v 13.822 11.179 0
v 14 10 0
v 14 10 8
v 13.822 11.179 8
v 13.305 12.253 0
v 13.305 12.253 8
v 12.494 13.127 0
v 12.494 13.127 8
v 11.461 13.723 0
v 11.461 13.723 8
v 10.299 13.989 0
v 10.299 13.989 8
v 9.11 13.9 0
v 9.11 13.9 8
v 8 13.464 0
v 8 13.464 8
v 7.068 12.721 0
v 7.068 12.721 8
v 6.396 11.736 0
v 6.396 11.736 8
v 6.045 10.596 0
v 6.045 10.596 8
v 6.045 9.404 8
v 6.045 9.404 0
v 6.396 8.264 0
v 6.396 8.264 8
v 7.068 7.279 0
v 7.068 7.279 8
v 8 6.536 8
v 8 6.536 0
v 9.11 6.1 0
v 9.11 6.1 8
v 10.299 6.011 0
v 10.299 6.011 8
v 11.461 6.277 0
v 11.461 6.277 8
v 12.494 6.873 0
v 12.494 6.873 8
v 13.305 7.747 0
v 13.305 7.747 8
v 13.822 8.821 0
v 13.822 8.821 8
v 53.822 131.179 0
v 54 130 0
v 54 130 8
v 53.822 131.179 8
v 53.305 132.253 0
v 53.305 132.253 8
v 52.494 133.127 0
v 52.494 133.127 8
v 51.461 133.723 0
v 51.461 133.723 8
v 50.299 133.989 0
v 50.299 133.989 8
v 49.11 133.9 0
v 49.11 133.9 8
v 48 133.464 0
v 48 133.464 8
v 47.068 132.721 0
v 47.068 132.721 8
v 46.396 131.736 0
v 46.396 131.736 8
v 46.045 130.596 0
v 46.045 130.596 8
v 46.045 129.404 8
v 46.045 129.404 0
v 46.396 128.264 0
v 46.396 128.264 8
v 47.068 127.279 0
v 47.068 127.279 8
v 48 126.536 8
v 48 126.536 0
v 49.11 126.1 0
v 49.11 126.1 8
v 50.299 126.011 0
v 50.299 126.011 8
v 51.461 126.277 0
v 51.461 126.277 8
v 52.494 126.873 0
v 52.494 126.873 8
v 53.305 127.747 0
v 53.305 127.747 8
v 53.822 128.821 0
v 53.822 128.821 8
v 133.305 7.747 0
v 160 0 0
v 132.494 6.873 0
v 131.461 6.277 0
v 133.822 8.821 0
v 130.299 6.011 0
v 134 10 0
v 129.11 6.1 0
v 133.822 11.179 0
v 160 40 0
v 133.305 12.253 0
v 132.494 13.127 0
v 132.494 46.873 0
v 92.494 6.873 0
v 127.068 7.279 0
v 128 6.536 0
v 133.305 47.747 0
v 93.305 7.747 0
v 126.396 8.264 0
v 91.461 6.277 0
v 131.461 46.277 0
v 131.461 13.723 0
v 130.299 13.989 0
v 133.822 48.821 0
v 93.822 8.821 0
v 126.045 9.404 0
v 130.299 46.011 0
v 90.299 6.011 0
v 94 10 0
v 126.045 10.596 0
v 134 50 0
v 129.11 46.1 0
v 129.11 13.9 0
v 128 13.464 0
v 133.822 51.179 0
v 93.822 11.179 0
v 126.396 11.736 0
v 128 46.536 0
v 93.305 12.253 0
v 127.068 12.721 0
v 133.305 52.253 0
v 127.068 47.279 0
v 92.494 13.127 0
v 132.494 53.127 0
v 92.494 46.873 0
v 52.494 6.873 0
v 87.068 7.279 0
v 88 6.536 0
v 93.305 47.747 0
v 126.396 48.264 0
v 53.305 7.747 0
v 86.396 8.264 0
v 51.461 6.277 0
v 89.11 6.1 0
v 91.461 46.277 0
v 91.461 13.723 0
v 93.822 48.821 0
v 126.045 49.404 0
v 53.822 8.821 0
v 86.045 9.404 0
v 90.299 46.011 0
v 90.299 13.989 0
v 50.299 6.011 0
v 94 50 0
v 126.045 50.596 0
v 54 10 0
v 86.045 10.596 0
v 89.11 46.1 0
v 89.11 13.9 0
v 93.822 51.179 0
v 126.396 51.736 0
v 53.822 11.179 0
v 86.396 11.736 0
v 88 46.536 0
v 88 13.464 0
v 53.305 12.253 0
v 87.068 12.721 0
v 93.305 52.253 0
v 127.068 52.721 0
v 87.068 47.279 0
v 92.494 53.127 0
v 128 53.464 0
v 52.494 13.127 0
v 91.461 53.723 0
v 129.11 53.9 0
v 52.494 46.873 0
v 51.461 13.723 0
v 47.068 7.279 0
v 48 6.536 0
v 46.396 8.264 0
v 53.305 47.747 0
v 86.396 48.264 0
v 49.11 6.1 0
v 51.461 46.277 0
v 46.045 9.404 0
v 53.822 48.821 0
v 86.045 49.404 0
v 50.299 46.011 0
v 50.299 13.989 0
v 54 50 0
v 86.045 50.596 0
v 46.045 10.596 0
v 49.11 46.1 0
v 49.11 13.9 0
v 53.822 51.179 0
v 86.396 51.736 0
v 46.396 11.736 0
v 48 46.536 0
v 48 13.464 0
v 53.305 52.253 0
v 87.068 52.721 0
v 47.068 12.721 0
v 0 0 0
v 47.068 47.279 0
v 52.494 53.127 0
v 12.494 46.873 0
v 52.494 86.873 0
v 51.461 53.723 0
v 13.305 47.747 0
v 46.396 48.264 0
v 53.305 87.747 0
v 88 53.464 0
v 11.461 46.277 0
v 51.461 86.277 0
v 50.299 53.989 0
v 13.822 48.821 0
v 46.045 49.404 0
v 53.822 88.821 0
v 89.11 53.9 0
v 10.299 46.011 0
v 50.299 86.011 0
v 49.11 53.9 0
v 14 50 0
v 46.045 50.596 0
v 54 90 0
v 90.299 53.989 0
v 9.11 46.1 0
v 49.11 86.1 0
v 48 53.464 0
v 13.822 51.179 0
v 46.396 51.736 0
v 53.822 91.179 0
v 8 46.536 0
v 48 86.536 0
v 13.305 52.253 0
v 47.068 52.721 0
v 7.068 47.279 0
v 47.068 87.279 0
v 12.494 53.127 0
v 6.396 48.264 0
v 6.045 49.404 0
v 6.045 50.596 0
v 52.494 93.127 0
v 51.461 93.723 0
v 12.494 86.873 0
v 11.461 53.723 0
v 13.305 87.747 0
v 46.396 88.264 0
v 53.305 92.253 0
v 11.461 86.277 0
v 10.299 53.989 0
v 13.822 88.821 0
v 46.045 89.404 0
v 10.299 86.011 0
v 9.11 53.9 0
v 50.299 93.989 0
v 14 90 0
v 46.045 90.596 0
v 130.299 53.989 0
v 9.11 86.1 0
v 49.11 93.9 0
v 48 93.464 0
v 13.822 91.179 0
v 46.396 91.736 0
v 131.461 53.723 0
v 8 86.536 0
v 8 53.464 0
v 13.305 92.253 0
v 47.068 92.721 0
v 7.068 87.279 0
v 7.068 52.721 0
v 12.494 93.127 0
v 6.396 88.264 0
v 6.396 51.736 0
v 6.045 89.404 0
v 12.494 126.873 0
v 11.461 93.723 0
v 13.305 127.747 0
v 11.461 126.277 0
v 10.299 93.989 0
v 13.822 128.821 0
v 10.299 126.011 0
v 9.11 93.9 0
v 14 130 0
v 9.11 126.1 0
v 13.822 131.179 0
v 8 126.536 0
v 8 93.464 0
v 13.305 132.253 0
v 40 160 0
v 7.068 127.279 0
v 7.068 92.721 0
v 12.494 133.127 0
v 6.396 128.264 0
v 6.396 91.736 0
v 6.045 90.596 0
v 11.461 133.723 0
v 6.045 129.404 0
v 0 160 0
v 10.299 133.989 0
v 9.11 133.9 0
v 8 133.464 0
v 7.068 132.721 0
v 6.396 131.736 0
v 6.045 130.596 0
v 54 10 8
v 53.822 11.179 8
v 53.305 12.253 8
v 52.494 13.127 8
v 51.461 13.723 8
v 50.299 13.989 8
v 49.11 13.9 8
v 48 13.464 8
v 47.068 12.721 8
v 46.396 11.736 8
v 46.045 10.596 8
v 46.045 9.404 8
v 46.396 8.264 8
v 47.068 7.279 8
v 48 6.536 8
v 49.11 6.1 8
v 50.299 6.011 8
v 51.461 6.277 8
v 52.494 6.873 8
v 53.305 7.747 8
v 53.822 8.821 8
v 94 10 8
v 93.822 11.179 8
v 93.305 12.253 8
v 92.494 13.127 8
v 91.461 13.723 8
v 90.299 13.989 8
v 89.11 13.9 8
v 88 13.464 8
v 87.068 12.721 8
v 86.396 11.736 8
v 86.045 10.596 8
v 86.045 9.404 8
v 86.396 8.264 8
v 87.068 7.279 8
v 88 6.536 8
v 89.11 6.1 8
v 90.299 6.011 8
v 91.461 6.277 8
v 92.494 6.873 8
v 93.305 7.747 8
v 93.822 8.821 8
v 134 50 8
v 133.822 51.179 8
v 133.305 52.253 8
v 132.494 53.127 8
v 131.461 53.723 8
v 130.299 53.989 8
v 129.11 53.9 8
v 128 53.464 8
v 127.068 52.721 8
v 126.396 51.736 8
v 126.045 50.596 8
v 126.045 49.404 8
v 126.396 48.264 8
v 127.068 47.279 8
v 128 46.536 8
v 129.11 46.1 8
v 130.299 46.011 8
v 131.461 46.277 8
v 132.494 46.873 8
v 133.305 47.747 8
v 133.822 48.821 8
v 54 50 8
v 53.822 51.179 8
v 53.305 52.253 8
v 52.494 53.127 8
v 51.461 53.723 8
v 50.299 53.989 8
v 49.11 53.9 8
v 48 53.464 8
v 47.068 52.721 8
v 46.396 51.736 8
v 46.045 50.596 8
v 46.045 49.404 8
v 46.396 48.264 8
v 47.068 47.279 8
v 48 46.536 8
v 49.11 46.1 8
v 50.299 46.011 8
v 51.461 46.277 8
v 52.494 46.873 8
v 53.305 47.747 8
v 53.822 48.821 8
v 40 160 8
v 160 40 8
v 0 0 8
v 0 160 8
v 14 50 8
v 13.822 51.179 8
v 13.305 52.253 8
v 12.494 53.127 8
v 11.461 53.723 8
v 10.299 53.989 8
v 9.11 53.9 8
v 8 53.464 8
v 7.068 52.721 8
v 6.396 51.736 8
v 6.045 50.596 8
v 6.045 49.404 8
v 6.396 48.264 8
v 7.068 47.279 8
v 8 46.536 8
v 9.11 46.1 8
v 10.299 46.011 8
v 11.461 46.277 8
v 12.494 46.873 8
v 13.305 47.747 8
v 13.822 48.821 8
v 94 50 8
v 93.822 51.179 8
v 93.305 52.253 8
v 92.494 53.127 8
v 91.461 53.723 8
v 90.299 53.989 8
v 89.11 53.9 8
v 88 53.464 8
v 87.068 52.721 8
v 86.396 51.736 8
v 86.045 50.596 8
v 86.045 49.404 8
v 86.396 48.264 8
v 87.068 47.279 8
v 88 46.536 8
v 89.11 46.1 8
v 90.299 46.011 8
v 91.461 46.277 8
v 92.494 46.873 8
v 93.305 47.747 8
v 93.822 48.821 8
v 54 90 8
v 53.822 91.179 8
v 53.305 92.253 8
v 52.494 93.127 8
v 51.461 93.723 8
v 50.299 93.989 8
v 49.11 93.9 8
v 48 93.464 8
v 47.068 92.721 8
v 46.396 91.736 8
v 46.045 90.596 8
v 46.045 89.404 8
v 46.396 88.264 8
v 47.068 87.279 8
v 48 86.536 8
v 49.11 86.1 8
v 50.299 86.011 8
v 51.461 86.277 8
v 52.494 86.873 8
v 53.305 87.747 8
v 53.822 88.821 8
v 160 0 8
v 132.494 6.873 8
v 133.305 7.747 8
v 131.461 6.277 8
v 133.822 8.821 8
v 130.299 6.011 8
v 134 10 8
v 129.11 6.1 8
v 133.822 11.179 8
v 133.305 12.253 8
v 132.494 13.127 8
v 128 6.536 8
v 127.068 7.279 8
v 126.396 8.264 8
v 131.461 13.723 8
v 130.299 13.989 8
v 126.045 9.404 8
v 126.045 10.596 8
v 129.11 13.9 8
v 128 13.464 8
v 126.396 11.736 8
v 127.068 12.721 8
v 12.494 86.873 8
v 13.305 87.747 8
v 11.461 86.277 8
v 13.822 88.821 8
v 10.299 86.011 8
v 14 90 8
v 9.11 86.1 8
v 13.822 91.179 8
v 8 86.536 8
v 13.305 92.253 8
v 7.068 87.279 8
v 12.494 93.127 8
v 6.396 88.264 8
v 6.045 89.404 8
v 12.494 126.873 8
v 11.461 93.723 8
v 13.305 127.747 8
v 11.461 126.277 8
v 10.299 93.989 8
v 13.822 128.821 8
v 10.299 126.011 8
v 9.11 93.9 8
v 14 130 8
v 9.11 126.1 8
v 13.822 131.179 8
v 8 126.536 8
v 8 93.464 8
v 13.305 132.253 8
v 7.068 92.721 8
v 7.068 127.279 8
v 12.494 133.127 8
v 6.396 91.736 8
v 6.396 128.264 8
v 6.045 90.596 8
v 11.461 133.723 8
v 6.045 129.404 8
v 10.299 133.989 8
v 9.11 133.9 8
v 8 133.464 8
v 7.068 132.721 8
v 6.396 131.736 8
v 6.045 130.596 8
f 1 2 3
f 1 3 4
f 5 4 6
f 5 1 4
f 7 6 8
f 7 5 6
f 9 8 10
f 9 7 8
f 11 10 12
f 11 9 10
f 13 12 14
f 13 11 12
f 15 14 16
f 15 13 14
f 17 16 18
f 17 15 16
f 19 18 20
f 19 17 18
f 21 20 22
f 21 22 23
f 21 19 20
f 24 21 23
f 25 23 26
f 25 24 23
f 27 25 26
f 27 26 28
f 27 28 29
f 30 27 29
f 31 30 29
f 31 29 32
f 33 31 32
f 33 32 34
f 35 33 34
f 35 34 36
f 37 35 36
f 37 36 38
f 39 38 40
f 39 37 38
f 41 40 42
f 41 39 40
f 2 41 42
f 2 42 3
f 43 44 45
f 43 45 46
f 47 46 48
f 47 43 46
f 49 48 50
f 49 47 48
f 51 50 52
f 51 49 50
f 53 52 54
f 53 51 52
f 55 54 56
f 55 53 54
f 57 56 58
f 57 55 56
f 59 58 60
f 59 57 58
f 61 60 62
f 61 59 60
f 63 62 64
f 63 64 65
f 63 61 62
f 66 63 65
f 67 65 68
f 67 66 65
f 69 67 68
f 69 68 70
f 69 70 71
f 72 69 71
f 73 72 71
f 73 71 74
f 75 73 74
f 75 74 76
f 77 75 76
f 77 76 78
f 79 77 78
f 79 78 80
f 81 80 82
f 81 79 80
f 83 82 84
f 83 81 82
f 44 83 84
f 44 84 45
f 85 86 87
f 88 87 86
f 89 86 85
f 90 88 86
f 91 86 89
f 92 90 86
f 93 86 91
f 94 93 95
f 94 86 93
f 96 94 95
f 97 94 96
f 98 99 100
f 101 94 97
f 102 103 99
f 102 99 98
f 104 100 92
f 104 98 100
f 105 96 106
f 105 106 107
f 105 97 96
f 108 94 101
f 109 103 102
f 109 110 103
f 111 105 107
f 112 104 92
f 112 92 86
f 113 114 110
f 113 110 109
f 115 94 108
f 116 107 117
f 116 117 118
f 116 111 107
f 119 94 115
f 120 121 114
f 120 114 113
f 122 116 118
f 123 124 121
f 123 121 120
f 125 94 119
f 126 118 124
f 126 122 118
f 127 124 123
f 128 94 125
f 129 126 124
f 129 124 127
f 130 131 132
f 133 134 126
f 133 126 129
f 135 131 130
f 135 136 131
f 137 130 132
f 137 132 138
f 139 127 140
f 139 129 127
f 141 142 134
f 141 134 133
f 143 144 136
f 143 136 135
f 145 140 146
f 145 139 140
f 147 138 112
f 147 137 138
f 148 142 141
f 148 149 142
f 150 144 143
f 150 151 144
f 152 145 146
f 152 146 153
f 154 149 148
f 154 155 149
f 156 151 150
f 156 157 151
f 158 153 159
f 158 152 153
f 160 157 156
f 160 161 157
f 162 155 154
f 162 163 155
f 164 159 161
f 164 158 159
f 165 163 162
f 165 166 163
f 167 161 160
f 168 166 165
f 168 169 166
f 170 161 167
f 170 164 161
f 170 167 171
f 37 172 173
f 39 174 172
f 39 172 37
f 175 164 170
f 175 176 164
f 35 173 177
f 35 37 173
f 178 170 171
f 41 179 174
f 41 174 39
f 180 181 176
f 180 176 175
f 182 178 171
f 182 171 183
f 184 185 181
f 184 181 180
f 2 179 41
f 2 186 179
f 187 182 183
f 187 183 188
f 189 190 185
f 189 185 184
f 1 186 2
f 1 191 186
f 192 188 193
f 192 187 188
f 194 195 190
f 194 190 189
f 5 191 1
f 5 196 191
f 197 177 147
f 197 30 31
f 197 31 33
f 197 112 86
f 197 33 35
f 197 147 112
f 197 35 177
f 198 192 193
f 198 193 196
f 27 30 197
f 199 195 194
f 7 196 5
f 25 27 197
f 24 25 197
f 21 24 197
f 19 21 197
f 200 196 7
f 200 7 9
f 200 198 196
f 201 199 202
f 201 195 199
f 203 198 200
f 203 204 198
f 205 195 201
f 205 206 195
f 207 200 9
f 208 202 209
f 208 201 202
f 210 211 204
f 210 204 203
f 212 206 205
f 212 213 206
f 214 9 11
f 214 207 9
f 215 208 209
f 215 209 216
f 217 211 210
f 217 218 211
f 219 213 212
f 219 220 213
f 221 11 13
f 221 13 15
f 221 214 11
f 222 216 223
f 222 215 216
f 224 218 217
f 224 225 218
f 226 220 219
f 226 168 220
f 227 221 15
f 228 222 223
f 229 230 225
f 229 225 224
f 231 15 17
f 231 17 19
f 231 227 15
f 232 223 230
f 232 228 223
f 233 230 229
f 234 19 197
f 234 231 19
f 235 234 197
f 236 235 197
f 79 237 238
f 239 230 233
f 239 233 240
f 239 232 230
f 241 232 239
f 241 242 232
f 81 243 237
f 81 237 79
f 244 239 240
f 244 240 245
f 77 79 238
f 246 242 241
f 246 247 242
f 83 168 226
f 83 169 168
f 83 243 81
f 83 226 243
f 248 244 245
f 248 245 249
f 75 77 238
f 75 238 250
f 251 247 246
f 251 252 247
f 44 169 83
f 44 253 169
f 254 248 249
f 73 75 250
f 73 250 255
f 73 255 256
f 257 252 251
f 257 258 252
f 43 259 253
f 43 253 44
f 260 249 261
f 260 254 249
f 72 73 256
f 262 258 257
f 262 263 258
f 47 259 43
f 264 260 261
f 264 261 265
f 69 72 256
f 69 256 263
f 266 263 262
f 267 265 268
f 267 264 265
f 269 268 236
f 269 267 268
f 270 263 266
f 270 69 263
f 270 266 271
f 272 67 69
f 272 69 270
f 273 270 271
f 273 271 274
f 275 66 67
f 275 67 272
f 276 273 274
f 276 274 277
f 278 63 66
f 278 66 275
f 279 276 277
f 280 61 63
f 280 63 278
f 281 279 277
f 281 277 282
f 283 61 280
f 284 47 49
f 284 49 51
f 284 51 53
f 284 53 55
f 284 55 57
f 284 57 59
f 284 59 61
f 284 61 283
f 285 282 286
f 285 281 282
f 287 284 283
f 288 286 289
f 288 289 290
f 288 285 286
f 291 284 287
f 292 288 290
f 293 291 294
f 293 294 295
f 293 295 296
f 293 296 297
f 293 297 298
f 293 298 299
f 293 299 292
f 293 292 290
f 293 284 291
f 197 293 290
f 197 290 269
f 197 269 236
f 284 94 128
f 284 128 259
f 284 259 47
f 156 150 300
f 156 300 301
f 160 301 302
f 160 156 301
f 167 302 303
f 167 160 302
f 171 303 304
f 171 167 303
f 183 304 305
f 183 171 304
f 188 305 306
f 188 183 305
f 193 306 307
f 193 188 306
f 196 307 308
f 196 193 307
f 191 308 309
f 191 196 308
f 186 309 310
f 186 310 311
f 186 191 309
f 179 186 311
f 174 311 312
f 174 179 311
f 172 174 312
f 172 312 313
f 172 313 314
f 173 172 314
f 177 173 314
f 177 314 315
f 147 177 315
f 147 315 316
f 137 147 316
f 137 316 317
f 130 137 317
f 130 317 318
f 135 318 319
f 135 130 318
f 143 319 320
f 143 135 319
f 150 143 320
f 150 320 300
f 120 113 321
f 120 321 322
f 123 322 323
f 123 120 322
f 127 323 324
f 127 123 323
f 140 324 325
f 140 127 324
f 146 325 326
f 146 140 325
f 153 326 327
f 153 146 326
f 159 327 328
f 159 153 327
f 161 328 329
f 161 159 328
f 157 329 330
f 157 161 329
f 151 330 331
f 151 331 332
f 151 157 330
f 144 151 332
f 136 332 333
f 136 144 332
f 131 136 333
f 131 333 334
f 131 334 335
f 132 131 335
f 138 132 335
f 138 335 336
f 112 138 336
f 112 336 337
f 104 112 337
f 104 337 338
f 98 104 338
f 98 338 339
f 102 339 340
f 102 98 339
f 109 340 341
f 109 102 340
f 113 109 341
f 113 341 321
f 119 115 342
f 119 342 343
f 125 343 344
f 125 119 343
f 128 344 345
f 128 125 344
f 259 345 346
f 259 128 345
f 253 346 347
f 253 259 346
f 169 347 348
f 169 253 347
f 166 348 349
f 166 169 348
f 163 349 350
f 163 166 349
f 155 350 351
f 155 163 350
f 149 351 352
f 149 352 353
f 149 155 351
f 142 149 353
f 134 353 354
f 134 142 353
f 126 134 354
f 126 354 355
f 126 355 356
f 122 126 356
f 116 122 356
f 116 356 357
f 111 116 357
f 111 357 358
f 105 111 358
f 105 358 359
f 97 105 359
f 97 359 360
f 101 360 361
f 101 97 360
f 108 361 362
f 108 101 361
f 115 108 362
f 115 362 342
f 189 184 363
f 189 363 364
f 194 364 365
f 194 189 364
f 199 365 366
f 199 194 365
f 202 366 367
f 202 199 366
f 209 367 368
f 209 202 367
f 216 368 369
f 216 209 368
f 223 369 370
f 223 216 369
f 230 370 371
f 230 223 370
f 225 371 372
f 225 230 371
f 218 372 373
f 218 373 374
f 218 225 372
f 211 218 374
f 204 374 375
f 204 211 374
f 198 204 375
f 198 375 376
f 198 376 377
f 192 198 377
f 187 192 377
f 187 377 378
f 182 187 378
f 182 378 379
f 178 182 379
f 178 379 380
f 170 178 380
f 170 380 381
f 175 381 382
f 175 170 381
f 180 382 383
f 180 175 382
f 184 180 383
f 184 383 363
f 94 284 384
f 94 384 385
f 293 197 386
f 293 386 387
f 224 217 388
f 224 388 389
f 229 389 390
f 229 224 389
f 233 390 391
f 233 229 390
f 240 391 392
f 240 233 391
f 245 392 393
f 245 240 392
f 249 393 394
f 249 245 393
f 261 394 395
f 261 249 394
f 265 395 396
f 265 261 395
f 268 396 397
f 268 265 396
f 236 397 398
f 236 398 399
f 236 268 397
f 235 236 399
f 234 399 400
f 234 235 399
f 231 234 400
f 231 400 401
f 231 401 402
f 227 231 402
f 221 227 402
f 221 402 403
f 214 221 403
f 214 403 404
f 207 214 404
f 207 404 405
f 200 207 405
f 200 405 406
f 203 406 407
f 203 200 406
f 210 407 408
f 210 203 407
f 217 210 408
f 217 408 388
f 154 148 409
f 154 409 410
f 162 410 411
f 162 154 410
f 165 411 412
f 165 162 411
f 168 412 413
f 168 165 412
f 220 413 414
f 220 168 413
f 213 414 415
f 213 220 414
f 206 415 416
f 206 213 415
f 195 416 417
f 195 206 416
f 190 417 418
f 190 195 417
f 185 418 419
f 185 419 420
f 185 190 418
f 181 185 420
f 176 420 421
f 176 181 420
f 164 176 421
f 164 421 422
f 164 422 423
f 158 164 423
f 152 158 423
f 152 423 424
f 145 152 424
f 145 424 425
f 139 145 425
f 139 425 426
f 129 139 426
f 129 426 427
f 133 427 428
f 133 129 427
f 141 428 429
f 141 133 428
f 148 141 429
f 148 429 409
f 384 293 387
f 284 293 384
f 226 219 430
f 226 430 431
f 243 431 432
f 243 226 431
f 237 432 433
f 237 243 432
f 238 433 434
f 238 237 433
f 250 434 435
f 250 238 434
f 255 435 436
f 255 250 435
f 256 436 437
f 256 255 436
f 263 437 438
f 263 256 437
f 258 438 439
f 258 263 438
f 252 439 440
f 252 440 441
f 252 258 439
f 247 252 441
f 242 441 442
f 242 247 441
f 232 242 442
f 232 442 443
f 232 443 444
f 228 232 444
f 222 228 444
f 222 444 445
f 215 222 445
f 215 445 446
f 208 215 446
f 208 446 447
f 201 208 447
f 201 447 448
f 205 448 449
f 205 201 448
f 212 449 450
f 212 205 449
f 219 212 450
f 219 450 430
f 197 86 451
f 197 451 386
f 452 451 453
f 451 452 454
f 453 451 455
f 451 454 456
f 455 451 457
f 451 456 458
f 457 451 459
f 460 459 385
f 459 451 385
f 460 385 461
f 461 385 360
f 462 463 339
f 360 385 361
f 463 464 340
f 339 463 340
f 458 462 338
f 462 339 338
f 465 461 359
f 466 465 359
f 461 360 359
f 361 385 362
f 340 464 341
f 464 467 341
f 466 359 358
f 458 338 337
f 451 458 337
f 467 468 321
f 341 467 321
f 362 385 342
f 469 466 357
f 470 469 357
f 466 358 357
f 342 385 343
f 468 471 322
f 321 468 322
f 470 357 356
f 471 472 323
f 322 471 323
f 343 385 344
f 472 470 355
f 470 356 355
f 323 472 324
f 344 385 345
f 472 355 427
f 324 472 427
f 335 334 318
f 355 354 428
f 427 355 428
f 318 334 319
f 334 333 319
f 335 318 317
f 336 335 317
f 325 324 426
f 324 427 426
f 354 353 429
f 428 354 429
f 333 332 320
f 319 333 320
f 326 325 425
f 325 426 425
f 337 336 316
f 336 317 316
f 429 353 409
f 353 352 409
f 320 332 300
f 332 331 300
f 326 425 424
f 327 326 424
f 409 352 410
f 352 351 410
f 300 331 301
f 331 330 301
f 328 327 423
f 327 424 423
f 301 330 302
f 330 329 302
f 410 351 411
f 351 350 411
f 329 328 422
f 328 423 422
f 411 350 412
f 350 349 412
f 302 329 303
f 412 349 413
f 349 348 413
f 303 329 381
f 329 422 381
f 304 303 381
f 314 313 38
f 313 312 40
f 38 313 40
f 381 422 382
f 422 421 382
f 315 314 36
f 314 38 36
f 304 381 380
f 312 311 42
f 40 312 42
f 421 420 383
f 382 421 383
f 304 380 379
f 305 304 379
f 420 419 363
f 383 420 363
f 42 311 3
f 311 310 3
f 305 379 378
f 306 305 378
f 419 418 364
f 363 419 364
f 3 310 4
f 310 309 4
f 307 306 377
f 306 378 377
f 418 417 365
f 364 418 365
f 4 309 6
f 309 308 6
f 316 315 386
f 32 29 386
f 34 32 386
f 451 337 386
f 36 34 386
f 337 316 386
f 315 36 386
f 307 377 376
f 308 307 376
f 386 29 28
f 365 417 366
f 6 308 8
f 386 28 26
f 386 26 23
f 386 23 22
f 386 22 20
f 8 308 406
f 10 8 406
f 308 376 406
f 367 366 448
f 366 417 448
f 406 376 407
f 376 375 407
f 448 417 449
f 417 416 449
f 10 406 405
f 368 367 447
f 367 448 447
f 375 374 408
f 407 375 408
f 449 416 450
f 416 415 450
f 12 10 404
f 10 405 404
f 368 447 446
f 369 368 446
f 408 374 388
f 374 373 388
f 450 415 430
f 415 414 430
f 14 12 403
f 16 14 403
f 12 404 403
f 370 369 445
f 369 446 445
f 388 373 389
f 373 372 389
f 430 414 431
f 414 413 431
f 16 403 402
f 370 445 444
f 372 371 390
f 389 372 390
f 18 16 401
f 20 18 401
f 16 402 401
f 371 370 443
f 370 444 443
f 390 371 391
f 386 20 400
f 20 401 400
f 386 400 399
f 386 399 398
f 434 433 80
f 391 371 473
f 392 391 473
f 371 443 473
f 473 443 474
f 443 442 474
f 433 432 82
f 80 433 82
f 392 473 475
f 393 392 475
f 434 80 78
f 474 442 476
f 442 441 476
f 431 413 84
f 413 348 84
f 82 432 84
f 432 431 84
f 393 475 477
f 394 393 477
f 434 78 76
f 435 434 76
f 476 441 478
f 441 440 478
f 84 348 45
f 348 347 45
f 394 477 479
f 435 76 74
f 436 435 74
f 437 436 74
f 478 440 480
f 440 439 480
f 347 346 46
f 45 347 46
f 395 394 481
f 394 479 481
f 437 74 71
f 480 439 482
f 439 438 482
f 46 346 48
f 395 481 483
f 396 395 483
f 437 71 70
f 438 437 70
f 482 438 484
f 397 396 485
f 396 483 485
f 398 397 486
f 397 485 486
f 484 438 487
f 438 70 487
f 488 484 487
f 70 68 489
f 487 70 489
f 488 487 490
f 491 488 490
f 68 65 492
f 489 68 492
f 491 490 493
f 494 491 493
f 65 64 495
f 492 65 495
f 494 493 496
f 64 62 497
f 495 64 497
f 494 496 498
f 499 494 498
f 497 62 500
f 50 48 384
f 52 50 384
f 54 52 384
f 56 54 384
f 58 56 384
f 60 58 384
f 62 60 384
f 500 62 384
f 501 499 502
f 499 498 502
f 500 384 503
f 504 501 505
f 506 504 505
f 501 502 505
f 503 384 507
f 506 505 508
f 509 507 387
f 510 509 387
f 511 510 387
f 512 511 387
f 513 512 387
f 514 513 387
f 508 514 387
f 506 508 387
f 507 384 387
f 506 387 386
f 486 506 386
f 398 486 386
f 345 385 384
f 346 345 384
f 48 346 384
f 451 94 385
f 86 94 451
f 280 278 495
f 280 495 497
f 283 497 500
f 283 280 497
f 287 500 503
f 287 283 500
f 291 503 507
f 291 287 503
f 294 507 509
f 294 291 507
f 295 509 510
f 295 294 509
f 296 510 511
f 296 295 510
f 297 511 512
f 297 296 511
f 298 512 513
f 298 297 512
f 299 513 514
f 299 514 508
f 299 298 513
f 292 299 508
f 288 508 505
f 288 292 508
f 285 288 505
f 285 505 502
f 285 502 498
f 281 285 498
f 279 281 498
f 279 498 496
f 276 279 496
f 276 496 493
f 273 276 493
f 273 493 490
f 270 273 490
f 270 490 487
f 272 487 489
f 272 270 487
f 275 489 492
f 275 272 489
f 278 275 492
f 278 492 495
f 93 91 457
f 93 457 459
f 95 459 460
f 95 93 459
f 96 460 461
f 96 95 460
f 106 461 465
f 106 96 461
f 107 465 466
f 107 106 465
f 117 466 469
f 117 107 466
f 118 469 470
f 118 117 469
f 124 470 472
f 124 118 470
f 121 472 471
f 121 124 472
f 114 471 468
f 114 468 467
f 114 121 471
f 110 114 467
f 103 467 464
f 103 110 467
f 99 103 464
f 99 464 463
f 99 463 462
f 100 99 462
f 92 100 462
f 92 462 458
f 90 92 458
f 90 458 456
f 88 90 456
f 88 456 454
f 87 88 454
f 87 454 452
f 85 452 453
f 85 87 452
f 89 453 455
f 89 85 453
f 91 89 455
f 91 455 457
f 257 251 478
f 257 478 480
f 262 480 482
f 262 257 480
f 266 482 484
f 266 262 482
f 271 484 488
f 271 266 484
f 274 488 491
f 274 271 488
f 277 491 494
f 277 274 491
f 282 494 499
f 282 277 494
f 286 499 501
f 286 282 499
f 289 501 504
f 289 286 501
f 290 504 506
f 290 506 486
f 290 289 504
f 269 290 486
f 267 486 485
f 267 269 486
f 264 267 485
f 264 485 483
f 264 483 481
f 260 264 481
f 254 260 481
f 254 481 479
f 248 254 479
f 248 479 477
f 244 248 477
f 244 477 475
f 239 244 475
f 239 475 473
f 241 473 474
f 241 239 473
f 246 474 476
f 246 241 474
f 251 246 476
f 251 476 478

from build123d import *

# Parameters (mm, degrees)
SKETCH1_R           = 4
BOSS_EXTRUDE1_DEPTH = 8


with BuildPart() as part:
    # Sketch1 → Boss-Extrude1 (new body)
    with BuildSketch(Plane.XY):
        Polygon((0, 0), (0, 160), (40, 160), (160, 40), (160, 0), align=None)
        with Locations((10, 10)):
            Circle(SKETCH1_R, mode=Mode.SUBTRACT)
        with Locations((50, 10)):
            Circle(SKETCH1_R, mode=Mode.SUBTRACT)
        with Locations((90, 10)):
            Circle(SKETCH1_R, mode=Mode.SUBTRACT)
        with Locations((10, 90)):
            Circle(SKETCH1_R, mode=Mode.SUBTRACT)
        with Locations((10, 50)):
            Circle(SKETCH1_R, mode=Mode.SUBTRACT)
        with Locations((130, 10)):
            Circle(SKETCH1_R, mode=Mode.SUBTRACT)
        with Locations((10, 130)):
            Circle(SKETCH1_R, mode=Mode.SUBTRACT)
        with Locations((130, 50)):
            Circle(SKETCH1_R, mode=Mode.SUBTRACT)
        with Locations((90, 50)):
            Circle(SKETCH1_R, mode=Mode.SUBTRACT)
        with Locations((50, 50)):
            Circle(SKETCH1_R, mode=Mode.SUBTRACT)
        with Locations((50, 130)):
            Circle(SKETCH1_R, mode=Mode.SUBTRACT)
        with Locations((50, 90)):
            Circle(SKETCH1_R, mode=Mode.SUBTRACT)
    extrude(amount=BOSS_EXTRUDE1_DEPTH)


solid = part.part
